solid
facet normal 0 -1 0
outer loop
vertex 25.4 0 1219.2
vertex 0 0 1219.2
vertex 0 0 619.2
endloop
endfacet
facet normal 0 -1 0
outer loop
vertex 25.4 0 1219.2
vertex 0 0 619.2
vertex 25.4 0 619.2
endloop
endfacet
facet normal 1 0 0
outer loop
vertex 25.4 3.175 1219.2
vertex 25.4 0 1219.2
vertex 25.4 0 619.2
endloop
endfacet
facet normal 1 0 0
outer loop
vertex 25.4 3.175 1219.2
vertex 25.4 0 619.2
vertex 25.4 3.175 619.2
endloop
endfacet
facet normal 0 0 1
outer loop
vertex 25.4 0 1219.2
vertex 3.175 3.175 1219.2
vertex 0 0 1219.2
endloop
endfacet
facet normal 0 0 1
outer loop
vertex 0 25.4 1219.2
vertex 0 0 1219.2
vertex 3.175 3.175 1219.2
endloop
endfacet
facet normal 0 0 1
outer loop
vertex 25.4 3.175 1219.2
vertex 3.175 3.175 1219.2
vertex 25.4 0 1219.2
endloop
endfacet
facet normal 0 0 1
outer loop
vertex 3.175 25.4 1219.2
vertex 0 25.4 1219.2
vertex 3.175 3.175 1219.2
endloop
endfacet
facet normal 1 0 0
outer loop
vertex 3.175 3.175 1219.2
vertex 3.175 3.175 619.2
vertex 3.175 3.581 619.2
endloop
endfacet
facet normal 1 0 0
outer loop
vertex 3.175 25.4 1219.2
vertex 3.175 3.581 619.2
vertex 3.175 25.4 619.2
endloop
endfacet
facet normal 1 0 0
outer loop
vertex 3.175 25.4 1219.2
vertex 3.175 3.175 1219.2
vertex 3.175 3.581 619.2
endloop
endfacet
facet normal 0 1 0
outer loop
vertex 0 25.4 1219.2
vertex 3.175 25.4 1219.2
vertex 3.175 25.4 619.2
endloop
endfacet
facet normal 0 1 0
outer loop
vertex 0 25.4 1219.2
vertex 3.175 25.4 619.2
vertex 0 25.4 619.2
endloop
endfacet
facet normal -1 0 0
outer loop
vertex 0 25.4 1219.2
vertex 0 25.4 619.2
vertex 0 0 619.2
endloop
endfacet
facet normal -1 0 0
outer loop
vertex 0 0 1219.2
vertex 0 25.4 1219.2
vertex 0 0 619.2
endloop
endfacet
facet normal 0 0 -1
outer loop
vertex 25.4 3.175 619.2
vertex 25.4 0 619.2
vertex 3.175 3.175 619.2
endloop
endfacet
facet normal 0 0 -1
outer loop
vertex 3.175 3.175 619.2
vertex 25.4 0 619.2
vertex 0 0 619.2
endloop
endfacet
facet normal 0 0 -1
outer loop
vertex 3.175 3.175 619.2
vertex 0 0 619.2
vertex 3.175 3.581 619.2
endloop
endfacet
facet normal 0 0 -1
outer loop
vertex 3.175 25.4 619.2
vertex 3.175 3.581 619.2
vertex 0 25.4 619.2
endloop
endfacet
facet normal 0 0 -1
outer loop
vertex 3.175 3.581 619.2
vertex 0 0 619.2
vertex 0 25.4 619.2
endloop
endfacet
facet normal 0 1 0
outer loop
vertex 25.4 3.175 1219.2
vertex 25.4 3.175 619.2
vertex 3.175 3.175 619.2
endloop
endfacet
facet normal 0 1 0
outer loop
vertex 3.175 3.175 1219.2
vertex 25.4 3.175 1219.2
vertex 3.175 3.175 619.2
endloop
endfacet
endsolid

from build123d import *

# Parameters (mm, degrees)
BOSS_EXTRUDE1_DEPTH = 1219.2
FILLET1_R           = 0.4064
SKETCH4_W           = 1838.4
SKETCH4_H           = 103.278519729
CUT_EXTRUDE1_DEPTH  = 60
SKETCH5_W           = 2.838427027
SKETCH5_H           = 1.970979722
CUT_EXTRUDE2_DEPTH  = 700


with BuildPart() as part:
    # Sketch3 → Boss-Extrude1 (new, symmetric)
    with BuildSketch(Plane.XY):
        Polygon((3.175, 25.4), (0, 25.4), (0, 0), (25.4, 0), (25.4, 3.175), (3.175, 3.175), align=None)
    extrude(amount=BOSS_EXTRUDE1_DEPTH, both=True)

    # Fillet1
    fillet1_edges = [part.edges().sort_by_distance(p)[0] for p in [
        (3.175, 3.175, 0),
    ]]
    fillet(fillet1_edges, radius=FILLET1_R)

    # Sketch4 → Cut-Extrude1 (cut)
    with BuildSketch(Plane.ZY):
        with Locations((-300, -26.239259864)):
            Rectangle(SKETCH4_W, SKETCH4_H)
    extrude(amount=-CUT_EXTRUDE1_DEPTH, mode=Mode.SUBTRACT)

    # Sketch5 → Cut-Extrude2 (cut)
    with BuildSketch(Plane(origin=(0, 0, 619.2), x_dir=(-1, 0, 0), z_dir=(0, 0, -1))):
        with Locations((-4.594213514, 4.160489861)):
            Rectangle(SKETCH5_W, SKETCH5_H)
    extrude(amount=-CUT_EXTRUDE2_DEPTH, mode=Mode.SUBTRACT)


solid = part.part
